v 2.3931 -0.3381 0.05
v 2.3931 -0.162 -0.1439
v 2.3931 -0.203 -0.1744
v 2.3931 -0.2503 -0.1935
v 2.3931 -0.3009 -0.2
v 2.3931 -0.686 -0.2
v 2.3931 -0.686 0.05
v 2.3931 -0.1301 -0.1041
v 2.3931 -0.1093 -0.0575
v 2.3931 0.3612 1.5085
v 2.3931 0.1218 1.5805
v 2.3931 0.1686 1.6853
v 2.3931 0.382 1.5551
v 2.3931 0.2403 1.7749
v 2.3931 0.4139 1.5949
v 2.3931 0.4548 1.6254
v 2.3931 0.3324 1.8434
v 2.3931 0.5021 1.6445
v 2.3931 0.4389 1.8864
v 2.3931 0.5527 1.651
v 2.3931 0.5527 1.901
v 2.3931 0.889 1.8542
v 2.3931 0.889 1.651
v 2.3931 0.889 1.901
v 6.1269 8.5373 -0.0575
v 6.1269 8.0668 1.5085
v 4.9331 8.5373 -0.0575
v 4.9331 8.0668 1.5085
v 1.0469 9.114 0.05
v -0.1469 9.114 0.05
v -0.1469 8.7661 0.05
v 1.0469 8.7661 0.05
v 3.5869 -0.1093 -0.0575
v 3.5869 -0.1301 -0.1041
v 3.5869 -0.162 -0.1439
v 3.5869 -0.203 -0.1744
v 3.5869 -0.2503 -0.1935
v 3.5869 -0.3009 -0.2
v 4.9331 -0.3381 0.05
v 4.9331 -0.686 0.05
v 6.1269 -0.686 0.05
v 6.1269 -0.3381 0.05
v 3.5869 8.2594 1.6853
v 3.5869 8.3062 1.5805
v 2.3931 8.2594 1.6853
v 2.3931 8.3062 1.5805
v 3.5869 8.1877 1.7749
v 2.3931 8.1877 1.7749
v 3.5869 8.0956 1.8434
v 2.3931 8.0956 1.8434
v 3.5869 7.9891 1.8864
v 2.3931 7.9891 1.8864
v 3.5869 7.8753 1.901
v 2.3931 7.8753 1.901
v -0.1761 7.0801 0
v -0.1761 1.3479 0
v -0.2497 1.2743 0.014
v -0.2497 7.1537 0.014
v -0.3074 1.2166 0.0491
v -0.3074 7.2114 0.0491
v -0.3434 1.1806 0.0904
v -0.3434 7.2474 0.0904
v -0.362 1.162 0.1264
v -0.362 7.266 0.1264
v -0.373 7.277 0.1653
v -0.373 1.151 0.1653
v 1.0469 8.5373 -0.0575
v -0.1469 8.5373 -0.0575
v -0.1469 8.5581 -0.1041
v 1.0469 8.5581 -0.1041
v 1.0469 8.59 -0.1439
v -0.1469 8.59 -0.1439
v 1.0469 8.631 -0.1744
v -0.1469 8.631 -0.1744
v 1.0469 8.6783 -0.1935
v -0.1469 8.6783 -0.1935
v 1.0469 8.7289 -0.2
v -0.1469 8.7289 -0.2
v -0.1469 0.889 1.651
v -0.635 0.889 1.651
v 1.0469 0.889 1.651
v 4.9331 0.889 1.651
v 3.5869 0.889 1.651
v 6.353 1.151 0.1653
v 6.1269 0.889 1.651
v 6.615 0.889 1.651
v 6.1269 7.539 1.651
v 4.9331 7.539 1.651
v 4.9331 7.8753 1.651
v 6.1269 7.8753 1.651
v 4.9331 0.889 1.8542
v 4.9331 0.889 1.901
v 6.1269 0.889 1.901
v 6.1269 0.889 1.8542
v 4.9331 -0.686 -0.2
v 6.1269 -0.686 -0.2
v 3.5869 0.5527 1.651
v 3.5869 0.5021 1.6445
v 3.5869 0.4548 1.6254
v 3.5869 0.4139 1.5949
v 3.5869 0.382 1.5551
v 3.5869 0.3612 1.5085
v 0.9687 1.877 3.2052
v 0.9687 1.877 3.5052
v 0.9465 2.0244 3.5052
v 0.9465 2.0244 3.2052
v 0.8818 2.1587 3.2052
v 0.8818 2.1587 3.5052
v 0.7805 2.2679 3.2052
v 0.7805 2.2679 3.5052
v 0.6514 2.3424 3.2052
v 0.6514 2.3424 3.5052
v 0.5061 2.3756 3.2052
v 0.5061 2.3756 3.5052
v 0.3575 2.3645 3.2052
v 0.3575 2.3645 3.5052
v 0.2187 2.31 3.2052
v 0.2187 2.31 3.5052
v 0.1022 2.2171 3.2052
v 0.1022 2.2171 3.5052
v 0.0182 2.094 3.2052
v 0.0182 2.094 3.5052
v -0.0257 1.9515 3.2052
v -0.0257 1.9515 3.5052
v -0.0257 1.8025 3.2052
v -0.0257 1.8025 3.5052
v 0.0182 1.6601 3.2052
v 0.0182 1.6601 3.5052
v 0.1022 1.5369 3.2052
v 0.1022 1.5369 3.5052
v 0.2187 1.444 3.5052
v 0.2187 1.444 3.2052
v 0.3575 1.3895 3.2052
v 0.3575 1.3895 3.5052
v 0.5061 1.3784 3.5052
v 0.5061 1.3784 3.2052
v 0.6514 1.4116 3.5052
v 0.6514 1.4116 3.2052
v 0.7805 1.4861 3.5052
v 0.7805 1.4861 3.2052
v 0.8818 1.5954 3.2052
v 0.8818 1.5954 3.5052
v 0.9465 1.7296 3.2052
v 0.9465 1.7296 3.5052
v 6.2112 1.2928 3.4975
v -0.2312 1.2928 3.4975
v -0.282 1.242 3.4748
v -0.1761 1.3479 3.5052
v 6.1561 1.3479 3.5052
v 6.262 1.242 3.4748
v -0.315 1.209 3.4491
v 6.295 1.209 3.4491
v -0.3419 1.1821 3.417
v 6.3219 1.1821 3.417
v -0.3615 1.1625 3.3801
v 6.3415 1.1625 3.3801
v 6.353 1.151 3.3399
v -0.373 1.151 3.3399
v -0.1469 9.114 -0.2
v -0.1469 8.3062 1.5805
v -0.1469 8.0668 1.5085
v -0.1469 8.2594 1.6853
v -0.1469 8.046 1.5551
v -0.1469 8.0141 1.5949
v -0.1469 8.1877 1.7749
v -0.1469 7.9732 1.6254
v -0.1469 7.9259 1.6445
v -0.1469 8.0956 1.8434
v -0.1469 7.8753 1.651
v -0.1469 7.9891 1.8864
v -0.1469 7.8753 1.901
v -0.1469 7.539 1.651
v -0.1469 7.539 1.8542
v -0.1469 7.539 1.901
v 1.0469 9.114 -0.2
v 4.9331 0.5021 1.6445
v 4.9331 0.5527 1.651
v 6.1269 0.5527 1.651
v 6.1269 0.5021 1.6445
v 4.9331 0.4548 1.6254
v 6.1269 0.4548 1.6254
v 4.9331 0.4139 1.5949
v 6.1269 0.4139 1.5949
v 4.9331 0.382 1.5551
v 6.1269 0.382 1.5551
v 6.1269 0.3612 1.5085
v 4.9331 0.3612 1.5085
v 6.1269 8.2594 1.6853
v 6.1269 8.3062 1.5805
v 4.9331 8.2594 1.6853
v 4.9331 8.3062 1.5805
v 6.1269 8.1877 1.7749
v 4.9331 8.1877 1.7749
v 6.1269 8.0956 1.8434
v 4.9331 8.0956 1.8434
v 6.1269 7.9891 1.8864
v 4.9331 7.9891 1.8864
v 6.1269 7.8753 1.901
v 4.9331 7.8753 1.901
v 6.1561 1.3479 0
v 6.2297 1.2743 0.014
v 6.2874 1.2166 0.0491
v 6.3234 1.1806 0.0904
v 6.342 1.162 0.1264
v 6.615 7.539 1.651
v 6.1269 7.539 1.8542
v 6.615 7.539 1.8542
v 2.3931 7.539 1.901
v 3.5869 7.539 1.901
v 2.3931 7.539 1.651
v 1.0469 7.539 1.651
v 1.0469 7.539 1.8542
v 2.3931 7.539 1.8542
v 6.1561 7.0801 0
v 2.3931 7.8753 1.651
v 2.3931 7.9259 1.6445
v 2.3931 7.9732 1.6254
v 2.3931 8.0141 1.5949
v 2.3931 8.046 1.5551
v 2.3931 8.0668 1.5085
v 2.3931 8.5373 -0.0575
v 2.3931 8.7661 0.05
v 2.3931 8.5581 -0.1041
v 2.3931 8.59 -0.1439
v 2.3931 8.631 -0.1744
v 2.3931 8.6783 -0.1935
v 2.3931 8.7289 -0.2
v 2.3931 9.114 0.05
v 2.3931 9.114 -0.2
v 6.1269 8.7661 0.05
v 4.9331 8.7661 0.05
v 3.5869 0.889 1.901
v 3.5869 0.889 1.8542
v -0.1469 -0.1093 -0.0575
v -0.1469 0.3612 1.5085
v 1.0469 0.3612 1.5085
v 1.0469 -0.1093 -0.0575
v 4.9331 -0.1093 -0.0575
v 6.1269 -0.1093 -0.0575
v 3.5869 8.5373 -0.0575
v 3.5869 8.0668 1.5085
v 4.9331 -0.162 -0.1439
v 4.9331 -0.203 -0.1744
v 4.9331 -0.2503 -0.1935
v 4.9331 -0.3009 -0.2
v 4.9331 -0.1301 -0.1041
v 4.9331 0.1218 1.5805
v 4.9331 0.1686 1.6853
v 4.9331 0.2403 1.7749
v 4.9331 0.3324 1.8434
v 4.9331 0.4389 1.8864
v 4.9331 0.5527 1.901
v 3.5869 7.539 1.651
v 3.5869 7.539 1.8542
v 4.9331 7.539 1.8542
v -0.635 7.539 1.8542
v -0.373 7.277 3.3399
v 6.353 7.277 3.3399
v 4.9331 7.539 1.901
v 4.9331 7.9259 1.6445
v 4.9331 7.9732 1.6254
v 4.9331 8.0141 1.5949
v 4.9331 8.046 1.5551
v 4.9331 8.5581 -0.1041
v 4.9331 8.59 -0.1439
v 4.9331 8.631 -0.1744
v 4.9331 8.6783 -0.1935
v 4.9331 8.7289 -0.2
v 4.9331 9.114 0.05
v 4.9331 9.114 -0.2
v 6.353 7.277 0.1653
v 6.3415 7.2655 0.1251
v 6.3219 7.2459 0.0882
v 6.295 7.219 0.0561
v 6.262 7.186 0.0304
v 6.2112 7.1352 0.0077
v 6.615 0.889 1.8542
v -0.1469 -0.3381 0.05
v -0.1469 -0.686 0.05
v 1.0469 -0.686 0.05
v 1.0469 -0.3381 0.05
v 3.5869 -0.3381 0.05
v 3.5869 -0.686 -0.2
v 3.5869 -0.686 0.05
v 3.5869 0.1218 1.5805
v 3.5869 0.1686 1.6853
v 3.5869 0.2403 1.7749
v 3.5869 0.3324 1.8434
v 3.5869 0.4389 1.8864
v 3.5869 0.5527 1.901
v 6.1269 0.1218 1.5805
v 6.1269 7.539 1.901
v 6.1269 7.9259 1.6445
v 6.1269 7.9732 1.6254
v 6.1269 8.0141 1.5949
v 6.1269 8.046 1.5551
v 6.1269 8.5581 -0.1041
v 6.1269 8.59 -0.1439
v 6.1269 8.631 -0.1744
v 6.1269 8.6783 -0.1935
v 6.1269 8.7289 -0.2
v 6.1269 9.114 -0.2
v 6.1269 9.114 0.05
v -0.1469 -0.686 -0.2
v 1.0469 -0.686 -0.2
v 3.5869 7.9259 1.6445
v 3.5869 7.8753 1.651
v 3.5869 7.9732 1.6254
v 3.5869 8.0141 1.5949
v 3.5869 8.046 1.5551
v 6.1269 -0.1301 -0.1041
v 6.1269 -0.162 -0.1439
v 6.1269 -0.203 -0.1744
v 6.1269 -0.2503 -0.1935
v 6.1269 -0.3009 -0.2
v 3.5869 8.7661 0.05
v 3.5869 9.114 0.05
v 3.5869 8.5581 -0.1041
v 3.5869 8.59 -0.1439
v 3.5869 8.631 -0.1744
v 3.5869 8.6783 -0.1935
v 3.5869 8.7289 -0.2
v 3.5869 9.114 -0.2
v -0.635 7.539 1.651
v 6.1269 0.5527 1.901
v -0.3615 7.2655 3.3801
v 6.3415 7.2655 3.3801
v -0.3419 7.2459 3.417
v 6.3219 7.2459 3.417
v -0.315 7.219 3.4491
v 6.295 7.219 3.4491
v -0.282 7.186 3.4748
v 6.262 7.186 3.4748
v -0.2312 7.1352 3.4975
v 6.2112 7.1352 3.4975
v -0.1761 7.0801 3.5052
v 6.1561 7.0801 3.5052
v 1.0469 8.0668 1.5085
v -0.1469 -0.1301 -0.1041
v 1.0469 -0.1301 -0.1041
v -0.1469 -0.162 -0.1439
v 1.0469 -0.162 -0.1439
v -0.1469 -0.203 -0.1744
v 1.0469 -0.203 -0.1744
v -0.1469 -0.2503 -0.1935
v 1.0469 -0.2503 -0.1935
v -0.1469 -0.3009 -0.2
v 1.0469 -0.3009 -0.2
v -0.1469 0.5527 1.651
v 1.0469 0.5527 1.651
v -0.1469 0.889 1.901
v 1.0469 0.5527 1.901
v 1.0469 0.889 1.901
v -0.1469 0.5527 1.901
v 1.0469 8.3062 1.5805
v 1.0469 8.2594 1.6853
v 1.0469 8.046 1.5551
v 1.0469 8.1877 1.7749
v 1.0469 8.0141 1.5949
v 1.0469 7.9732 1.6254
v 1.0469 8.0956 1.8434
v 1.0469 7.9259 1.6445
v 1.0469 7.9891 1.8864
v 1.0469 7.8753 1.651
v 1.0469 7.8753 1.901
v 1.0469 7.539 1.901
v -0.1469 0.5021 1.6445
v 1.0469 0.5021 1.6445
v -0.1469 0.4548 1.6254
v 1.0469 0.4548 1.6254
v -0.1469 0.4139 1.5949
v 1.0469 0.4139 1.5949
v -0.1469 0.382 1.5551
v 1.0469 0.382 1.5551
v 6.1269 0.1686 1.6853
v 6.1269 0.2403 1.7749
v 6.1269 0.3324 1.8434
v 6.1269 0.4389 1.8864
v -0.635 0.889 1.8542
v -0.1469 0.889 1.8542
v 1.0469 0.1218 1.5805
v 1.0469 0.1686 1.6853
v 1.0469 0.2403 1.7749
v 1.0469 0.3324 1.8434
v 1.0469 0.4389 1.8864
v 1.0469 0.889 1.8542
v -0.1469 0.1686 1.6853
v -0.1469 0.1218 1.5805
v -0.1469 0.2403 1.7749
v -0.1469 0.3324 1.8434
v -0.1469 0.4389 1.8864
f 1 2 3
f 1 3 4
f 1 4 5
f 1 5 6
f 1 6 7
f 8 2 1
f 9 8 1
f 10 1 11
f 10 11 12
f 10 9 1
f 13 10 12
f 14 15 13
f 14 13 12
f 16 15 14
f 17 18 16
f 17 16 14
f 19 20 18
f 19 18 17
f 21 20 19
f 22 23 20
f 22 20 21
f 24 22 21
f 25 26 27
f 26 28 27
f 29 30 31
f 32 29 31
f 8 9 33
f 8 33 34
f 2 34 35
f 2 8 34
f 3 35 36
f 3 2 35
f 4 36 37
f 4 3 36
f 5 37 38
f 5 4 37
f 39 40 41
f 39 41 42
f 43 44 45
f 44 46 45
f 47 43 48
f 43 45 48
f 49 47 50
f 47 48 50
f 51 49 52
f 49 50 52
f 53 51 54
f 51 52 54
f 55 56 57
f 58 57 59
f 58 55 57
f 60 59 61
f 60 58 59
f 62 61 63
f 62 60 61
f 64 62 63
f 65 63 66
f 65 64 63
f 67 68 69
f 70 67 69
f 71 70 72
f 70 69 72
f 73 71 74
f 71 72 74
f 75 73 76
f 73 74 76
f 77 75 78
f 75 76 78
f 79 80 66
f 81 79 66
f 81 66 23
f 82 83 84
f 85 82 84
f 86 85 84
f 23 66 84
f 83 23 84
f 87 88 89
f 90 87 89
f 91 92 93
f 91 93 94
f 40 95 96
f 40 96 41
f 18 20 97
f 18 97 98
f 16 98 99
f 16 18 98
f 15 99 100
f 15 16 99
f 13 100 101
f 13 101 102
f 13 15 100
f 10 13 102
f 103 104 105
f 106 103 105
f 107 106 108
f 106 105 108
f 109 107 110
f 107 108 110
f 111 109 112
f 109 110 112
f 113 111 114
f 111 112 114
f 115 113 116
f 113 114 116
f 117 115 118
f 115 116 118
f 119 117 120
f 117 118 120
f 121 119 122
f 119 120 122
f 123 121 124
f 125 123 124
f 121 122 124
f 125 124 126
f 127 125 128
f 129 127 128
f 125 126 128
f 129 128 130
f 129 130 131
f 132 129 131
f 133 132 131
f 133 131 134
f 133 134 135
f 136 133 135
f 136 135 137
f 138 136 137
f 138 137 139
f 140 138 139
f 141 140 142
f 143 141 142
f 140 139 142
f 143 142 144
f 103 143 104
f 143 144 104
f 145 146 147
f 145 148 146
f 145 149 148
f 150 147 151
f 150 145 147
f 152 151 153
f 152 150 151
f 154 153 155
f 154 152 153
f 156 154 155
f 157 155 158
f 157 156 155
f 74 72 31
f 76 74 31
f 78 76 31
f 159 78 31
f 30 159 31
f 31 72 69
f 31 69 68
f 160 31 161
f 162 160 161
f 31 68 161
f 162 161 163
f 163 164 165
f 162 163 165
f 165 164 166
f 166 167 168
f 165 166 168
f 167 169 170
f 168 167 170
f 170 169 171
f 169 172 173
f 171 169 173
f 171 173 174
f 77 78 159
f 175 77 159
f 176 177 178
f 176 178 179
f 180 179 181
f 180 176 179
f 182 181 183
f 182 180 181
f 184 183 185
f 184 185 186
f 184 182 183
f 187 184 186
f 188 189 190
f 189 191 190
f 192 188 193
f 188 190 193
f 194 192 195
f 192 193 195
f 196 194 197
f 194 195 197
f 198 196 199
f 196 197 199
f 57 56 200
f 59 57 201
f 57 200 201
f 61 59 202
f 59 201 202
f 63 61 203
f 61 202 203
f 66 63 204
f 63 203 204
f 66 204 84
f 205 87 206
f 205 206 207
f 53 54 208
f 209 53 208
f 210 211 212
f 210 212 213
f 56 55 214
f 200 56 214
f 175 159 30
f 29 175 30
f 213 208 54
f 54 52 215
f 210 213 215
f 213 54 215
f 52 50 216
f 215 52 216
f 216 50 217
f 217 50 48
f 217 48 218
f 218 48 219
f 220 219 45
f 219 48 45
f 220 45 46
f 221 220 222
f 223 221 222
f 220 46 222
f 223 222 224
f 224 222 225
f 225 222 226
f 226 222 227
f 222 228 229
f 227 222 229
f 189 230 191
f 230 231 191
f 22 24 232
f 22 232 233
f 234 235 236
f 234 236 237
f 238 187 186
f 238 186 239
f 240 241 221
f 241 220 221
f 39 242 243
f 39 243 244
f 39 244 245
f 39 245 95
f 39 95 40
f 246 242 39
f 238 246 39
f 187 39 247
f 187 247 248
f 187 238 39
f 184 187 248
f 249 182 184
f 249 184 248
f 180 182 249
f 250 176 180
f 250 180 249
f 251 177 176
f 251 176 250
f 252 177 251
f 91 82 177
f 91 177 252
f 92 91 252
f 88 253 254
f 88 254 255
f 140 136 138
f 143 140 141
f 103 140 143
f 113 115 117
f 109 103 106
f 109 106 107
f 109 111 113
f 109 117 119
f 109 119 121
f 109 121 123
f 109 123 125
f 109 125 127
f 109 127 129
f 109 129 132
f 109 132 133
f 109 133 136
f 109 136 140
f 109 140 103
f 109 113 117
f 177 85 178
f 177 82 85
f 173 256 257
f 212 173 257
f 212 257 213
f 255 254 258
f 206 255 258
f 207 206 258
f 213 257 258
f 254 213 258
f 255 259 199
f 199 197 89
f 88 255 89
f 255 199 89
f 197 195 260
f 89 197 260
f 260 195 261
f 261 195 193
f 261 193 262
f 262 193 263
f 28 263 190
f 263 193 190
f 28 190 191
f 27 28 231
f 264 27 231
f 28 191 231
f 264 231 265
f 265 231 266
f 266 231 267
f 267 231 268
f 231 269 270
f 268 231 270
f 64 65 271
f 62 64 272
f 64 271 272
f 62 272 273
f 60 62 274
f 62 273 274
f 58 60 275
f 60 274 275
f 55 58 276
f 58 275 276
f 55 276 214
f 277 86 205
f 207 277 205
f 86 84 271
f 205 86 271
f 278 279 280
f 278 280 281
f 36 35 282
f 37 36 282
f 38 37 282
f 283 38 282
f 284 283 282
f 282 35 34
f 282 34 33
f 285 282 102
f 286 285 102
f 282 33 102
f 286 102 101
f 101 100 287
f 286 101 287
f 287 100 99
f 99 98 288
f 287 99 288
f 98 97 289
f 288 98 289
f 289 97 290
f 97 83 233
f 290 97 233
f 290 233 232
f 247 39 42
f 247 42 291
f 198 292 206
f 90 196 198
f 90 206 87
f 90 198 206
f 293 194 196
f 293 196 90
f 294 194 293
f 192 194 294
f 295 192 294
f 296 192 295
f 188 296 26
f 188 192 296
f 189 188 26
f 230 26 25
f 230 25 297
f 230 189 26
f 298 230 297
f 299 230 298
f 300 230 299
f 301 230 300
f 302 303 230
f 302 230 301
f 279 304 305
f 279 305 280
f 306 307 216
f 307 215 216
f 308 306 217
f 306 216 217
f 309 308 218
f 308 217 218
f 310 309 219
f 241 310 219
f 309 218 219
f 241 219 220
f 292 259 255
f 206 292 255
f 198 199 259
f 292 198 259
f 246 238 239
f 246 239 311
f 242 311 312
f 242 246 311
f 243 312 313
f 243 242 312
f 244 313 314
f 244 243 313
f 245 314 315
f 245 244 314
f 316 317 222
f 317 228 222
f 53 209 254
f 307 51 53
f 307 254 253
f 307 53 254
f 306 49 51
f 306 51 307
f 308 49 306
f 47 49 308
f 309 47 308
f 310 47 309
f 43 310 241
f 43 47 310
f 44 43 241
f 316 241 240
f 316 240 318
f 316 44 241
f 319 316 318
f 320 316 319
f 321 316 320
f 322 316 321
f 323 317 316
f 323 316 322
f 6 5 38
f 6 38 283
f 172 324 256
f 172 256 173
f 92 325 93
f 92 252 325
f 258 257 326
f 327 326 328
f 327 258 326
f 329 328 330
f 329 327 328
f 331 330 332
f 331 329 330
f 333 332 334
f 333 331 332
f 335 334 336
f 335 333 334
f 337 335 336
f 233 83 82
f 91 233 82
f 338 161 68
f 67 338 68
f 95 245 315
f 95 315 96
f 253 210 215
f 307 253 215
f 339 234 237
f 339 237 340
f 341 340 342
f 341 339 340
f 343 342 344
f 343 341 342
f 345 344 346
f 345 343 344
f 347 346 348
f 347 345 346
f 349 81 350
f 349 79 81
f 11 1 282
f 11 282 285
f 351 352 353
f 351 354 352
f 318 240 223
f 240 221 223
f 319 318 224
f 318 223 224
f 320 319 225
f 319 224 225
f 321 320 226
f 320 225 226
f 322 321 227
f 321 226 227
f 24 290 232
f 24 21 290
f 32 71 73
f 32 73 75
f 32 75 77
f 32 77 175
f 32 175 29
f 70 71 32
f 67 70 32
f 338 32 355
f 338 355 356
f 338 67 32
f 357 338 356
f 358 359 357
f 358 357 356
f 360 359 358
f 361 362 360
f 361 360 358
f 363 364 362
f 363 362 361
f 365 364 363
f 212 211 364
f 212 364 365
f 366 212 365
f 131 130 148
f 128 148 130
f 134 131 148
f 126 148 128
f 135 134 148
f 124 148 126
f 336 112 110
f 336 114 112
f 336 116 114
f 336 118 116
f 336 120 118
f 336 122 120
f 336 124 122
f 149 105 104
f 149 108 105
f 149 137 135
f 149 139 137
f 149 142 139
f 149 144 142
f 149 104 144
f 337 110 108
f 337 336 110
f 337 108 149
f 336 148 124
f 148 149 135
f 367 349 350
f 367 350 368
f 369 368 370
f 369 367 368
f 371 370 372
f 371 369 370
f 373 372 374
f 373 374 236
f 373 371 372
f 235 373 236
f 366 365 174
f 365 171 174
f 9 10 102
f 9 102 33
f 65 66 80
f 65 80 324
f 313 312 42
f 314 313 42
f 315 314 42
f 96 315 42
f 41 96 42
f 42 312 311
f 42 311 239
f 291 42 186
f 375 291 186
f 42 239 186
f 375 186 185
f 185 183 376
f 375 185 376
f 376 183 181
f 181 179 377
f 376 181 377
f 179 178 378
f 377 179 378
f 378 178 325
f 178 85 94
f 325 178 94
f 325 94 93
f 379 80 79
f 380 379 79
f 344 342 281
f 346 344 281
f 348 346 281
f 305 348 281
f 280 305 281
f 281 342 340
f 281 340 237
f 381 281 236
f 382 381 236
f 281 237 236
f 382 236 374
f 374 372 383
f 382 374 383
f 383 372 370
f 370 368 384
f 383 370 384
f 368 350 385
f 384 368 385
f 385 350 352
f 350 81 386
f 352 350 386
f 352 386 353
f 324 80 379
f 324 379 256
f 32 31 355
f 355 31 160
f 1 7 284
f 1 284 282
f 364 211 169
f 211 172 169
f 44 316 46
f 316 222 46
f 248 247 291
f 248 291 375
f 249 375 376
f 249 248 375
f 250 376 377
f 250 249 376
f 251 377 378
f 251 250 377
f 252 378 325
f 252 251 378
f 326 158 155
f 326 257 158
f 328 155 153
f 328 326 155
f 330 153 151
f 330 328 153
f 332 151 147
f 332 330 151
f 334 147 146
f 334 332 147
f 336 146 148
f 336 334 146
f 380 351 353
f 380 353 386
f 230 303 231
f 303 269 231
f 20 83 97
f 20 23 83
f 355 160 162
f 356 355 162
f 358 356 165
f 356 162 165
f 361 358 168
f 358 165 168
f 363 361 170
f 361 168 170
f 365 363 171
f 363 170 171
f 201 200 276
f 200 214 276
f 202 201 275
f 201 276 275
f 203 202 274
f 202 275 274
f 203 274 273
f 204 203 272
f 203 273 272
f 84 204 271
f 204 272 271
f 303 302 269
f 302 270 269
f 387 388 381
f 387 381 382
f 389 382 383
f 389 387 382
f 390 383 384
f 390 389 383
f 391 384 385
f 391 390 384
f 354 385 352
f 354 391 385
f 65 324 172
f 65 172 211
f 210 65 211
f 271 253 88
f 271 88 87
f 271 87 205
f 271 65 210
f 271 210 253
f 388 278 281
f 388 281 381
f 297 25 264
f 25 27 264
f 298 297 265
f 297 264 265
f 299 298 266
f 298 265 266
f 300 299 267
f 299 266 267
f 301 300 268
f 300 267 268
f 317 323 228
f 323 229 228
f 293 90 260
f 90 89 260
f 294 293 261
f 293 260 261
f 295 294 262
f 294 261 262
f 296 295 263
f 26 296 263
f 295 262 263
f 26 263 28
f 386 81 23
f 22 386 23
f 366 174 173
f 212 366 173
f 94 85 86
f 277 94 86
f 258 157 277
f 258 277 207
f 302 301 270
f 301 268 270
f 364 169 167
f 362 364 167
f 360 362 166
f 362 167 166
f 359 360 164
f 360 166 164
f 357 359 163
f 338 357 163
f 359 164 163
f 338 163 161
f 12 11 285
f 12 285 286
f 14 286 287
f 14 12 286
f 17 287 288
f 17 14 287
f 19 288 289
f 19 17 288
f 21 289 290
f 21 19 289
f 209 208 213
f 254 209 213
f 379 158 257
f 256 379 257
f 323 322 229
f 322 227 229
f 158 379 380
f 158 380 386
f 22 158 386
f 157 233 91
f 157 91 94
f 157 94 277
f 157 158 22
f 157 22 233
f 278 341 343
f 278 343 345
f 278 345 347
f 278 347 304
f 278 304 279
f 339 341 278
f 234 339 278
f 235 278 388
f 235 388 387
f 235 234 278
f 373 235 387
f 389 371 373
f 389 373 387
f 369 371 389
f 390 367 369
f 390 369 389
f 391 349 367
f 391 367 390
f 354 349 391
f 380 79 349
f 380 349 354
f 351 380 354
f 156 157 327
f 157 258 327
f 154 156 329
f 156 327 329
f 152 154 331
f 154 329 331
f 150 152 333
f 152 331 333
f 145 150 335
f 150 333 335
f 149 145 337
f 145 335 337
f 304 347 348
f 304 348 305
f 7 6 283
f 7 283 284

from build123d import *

# Parameters (mm, degrees)
SKETCH1_W                = 7.25
SKETCH1_H                = 6.65
BASE_EXTRUDE_DEPTH       = 3.5052
CHAMFER1_SIZE            = 1.651
CHAMFER1_SIZE2           = 0.291115845
CHAMFER1_PART_2_SIZE     = 1.651
CHAMFER1_PART_2_SIZE2    = 0.291115845
CHAMFER1_PART_3_SIZE     = 1.651
CHAMFER1_PART_3_SIZE2    = 0.291115845
CHAMFER1_PART_4_SIZE     = 1.651
CHAMFER1_PART_4_SIZE2    = 0.291115845
CHAMFER2_SIZE            = 1.651
CHAMFER2_SIZE2           = 0.291115845
CHAMFER2_PART_2_SIZE     = 1.651
CHAMFER2_PART_2_SIZE2    = 0.291115845
CHAMFER2_PART_3_SIZE     = 1.651
CHAMFER2_PART_3_SIZE2    = 0.291115845
CHAMFER2_PART_4_SIZE     = 1.651
CHAMFER2_PART_4_SIZE2    = 0.291115845
SKETCH3_R                = 0.5
CUT_EXTRUDE1_DEPTH       = 0.3
BOSS_EXTRUDE_THIN3_DEPTH = 0.5969
LPATTERN1_COUNT          = 3
LPATTERN1_PITCH          = 2.54
MIRROR1_COPY_1_DEPTH     = 0.5969
MIRROR1_COPY_2_DEPTH     = 0.5969
FILLET_1_R               = 0.2


with BuildPart() as part:
    # Sketch1 → Base-Extrude (new body)
    with BuildSketch(Plane.XY):
        with Locations((2.99, 4.214)):
            Rectangle(SKETCH1_W, SKETCH1_H)
    extrude(amount=BASE_EXTRUDE_DEPTH)

    # Chamfer1
    chamfer1_edges = [part.edges().sort_by_distance(p)[0] for p in [
        (6.615, 4.214, 3.5052),
    ]]
    chamfer1_side = [part.faces().sort_by_distance(p)[0] for p in [
        (6.615, 4.214, 1.7526),
    ]]
    chamfer(chamfer1_edges, length=CHAMFER1_SIZE, length2=CHAMFER1_SIZE2, reference=chamfer1_side[0])

    # Chamfer1 part 2
    chamfer1_part_2_edges = [part.edges().sort_by_distance(p)[0] for p in [
        (2.99, 7.539, 3.5052),
    ]]
    chamfer1_part_2_side = [part.faces().sort_by_distance(p)[0] for p in [
        (2.99, 7.539, 1.7526),
    ]]
    chamfer(chamfer1_part_2_edges, length=CHAMFER1_PART_2_SIZE, length2=CHAMFER1_PART_2_SIZE2, reference=chamfer1_part_2_side[0])

    # Chamfer1 part 3
    chamfer1_part_3_edges = [part.edges().sort_by_distance(p)[0] for p in [
        (-0.635, 4.214, 3.5052),
    ]]
    chamfer1_part_3_side = [part.faces().sort_by_distance(p)[0] for p in [
        (-0.635, 4.214, 1.7526),
    ]]
    chamfer(chamfer1_part_3_edges, length=CHAMFER1_PART_3_SIZE, length2=CHAMFER1_PART_3_SIZE2, reference=chamfer1_part_3_side[0])

    # Chamfer1 part 4
    chamfer1_part_4_edges = [part.edges().sort_by_distance(p)[0] for p in [
        (2.99, 0.889, 3.5052),
    ]]
    chamfer1_part_4_side = [part.faces().sort_by_distance(p)[0] for p in [
        (2.99, 0.889, 1.7526),
    ]]
    chamfer(chamfer1_part_4_edges, length=CHAMFER1_PART_4_SIZE, length2=CHAMFER1_PART_4_SIZE2, reference=chamfer1_part_4_side[0])

    # Chamfer2
    chamfer2_edges = [part.edges().sort_by_distance(p)[0] for p in [
        (2.99, 7.539, 0),
    ]]
    chamfer2_side = [part.faces().sort_by_distance(p)[0] for p in [
        (2.99, 7.539, 0.9271),
    ]]
    chamfer(chamfer2_edges, length=CHAMFER2_SIZE, length2=CHAMFER2_SIZE2, reference=chamfer2_side[0])

    # Chamfer2 part 2
    chamfer2_part_2_edges = [part.edges().sort_by_distance(p)[0] for p in [
        (6.615, 4.214, 0),
    ]]
    chamfer2_part_2_side = [part.faces().sort_by_distance(p)[0] for p in [
        (6.615, 4.214, 0.9271),
    ]]
    chamfer(chamfer2_part_2_edges, length=CHAMFER2_PART_2_SIZE, length2=CHAMFER2_PART_2_SIZE2, reference=chamfer2_part_2_side[0])

    # Chamfer2 part 3
    chamfer2_part_3_edges = [part.edges().sort_by_distance(p)[0] for p in [
        (2.99, 0.889, 0),
    ]]
    chamfer2_part_3_side = [part.faces().sort_by_distance(p)[0] for p in [
        (2.99, 0.889, 0.9271),
    ]]
    chamfer(chamfer2_part_3_edges, length=CHAMFER2_PART_3_SIZE, length2=CHAMFER2_PART_3_SIZE2, reference=chamfer2_part_3_side[0])

    # Chamfer2 part 4
    chamfer2_part_4_edges = [part.edges().sort_by_distance(p)[0] for p in [
        (-0.635, 4.214, 0),
    ]]
    chamfer2_part_4_side = [part.faces().sort_by_distance(p)[0] for p in [
        (-0.635, 4.214, 0.9271),
    ]]
    chamfer(chamfer2_part_4_edges, length=CHAMFER2_PART_4_SIZE, length2=CHAMFER2_PART_4_SIZE2, reference=chamfer2_part_4_side[0])

    # Sketch3 → Cut-Extrude1 (cut)
    with BuildSketch(Plane(origin=(0.118935742, 0.142956615, 3.5052), x_dir=(1, 0, 0), z_dir=(0, 0, 1))):
        with Locations((0.349775267, 1.734053999)):
            Circle(SKETCH3_R)
    extrude(amount=-CUT_EXTRUDE1_DEPTH, mode=Mode.SUBTRACT)

    # Sketch4 → Boss-Extrude-Thin3 (add, symmetric)
    with BuildSketch(Plane.ZY.offset(-0.45)):
        with BuildLine():
            Line((1.651, 0.889), (1.651, 0.552741678))
            ThreePointArc((1.651, 0.552741678), (1.61148335, 0.433388864), (1.508549057, 0.361200283))
            Line((1.508549057, 0.361200283), (-0.057549057, -0.109337536))
            ThreePointArc((-0.057549057, -0.109337536), (-0.16048335, -0.181526117), (-0.2, -0.300878931))
            Line((-0.2, -0.300878931), (-0.2, -0.686))
            Line((-0.2, -0.686), (0.05, -0.686))
            Line((0.05, -0.686), (0.05, -0.33806435))
            Line((0.05, -0.33806435), (1.580485379, 0.121773539))
            ThreePointArc((1.580485379, 0.121773539), (1.812087538, 0.284197846), (1.901, 0.552741678))
            Line((1.901, 0.552741678), (1.901, 0.889))
            Line((1.901, 0.889), (1.651, 0.889))
        make_face()
    boss_extrude_thin3 = extrude(amount=BOSS_EXTRUDE_THIN3_DEPTH, both=True)

    # LPattern1: Boss-Extrude-Thin3 ×3
    with Locations(*[(i * LPATTERN1_PITCH, 0, 0) for i in range(1, LPATTERN1_COUNT)]):
        add(boss_extrude_thin3)

    # Mirror1: Boss-Extrude-Thin3 across plane
    add(boss_extrude_thin3.mirror(Plane(origin=(0, 4.214, 0), x_dir=(0, 0, 1), z_dir=(0, -1, 0))))

    # Mirror1 copy 1 sketch → Mirror1 copy 1 (add, symmetric)
    with BuildSketch(Plane(origin=(2.99, 8.428, 0), x_dir=(0, 0, 1), z_dir=(-1, 0, 0))):
        with BuildLine():
            Line((1.651, -0.889), (1.651, -0.552741678))
            ThreePointArc((1.651, -0.552741678), (1.61148335, -0.433388864), (1.508549057, -0.361200283))
            Line((1.508549057, -0.361200283), (-0.057549057, 0.109337536))
            ThreePointArc((-0.057549057, 0.109337536), (-0.16048335, 0.181526117), (-0.2, 0.300878931))
            Line((-0.2, 0.300878931), (-0.2, 0.686))
            Line((-0.2, 0.686), (0.05, 0.686))
            Line((0.05, 0.686), (0.05, 0.33806435))
            Line((0.05, 0.33806435), (1.580485379, -0.121773539))
            ThreePointArc((1.580485379, -0.121773539), (1.812087538, -0.284197846), (1.901, -0.552741678))
            Line((1.901, -0.552741678), (1.901, -0.889))
            Line((1.901, -0.889), (1.651, -0.889))
        make_face()
    extrude(amount=MIRROR1_COPY_1_DEPTH, both=True)

    # Mirror1 copy 2 sketch → Mirror1 copy 2 (add, symmetric)
    with BuildSketch(Plane(origin=(5.53, 8.428, 0), x_dir=(0, 0, 1), z_dir=(-1, 0, 0))):
        with BuildLine():
            Line((1.651, -0.889), (1.651, -0.552741678))
            ThreePointArc((1.651, -0.552741678), (1.61148335, -0.433388864), (1.508549057, -0.361200283))
            Line((1.508549057, -0.361200283), (-0.057549057, 0.109337536))
            ThreePointArc((-0.057549057, 0.109337536), (-0.16048335, 0.181526117), (-0.2, 0.300878931))
            Line((-0.2, 0.300878931), (-0.2, 0.686))
            Line((-0.2, 0.686), (0.05, 0.686))
            Line((0.05, 0.686), (0.05, 0.33806435))
            Line((0.05, 0.33806435), (1.580485379, -0.121773539))
            ThreePointArc((1.580485379, -0.121773539), (1.812087538, -0.284197846), (1.901, -0.552741678))
            Line((1.901, -0.552741678), (1.901, -0.889))
            Line((1.901, -0.889), (1.651, -0.889))
        make_face()
    extrude(amount=MIRROR1_COPY_2_DEPTH, both=True)

    # Скругление1
    fillet_1_edges = [part.edges().sort_by_distance(p)[0] for p in [
        (-0.343884155, 4.214, 3.5052),
        (2.99, 7.247884155, 3.5052),
        (6.323884155, 4.214, 3.5052),
        (2.99, 1.180115845, 3.5052),
        (-0.343884155, 4.214, 0),
        (2.99, 7.247884155, 0),
        (6.323884155, 4.214, 0),
        (2.99, 1.180115845, 0),
    ]]
    fillet(fillet_1_edges, radius=FILLET_1_R)


solid = part.part
